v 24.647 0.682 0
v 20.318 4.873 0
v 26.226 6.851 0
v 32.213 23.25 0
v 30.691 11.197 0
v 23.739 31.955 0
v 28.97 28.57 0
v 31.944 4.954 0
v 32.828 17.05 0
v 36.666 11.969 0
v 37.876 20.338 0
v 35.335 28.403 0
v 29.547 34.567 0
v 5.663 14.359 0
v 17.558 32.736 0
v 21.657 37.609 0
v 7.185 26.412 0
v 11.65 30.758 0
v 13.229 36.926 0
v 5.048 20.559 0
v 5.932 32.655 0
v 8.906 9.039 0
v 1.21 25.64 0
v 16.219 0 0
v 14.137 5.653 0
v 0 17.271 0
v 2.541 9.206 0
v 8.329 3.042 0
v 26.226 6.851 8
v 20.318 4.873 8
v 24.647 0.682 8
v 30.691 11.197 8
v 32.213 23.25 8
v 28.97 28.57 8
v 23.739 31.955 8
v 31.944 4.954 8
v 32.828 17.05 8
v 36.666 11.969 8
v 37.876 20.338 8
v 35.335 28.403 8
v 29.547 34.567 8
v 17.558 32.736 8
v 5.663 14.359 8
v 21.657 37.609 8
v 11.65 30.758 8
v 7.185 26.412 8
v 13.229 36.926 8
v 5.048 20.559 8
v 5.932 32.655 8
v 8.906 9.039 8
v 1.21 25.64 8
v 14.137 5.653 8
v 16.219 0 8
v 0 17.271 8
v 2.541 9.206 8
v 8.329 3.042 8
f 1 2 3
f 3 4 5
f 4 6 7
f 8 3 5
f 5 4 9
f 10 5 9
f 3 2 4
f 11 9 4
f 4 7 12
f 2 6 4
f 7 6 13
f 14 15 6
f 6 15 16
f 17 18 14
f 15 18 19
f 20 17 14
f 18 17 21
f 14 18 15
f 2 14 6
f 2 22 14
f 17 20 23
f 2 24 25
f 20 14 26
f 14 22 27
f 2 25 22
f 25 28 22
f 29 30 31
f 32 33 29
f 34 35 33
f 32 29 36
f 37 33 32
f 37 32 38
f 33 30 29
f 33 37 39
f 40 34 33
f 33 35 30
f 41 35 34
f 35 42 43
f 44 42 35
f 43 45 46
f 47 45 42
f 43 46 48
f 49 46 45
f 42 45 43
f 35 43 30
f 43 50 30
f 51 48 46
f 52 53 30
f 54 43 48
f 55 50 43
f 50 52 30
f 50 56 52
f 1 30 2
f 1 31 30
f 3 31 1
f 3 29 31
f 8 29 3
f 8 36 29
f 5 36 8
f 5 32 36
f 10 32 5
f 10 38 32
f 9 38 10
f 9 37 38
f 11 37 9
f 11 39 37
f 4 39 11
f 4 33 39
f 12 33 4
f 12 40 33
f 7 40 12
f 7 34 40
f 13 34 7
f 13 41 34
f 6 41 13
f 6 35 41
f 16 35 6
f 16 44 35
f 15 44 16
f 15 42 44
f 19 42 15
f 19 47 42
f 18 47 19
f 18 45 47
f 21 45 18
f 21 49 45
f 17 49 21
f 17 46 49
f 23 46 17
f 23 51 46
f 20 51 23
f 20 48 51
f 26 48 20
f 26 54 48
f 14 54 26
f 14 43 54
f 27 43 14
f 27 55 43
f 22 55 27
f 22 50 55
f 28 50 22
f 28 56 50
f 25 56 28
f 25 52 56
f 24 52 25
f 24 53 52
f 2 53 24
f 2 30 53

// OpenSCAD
$fn = 32;

// ----------------------------------------------------------------------
// Chain sprocket: 14 teeth, 14 mm root radius
// ----------------------------------------------------------------------

// --- parameters (mm) ---
profile_height = 8;       // extrusion height
profile_points = 28;      // points of the closed outline

profile = [[32.828, 17.05], [37.876, 20.338], [32.213, 23.25], [35.335, 28.403], [28.97, 28.57], [29.547, 34.567], [23.739, 31.955], [21.657, 37.609], [17.558, 32.736], [13.229, 36.926], [11.65, 30.758], [5.932, 32.655], [7.185, 26.412], [1.21, 25.64], [5.048, 20.559], [0, 17.271], [5.663, 14.359], [2.541, 9.206], [8.906, 9.039], [8.329, 3.042], [14.137, 5.653], [16.219, 0], [20.318, 4.873], [24.647, 0.682], [26.226, 6.851], [31.944, 4.954], [30.691, 11.197], [36.666, 11.969]];  // single closed polygon, 28 points, counter clockwise

// --- the one profile operation ---
linear_extrude(height = profile_height) polygon(points = profile);
